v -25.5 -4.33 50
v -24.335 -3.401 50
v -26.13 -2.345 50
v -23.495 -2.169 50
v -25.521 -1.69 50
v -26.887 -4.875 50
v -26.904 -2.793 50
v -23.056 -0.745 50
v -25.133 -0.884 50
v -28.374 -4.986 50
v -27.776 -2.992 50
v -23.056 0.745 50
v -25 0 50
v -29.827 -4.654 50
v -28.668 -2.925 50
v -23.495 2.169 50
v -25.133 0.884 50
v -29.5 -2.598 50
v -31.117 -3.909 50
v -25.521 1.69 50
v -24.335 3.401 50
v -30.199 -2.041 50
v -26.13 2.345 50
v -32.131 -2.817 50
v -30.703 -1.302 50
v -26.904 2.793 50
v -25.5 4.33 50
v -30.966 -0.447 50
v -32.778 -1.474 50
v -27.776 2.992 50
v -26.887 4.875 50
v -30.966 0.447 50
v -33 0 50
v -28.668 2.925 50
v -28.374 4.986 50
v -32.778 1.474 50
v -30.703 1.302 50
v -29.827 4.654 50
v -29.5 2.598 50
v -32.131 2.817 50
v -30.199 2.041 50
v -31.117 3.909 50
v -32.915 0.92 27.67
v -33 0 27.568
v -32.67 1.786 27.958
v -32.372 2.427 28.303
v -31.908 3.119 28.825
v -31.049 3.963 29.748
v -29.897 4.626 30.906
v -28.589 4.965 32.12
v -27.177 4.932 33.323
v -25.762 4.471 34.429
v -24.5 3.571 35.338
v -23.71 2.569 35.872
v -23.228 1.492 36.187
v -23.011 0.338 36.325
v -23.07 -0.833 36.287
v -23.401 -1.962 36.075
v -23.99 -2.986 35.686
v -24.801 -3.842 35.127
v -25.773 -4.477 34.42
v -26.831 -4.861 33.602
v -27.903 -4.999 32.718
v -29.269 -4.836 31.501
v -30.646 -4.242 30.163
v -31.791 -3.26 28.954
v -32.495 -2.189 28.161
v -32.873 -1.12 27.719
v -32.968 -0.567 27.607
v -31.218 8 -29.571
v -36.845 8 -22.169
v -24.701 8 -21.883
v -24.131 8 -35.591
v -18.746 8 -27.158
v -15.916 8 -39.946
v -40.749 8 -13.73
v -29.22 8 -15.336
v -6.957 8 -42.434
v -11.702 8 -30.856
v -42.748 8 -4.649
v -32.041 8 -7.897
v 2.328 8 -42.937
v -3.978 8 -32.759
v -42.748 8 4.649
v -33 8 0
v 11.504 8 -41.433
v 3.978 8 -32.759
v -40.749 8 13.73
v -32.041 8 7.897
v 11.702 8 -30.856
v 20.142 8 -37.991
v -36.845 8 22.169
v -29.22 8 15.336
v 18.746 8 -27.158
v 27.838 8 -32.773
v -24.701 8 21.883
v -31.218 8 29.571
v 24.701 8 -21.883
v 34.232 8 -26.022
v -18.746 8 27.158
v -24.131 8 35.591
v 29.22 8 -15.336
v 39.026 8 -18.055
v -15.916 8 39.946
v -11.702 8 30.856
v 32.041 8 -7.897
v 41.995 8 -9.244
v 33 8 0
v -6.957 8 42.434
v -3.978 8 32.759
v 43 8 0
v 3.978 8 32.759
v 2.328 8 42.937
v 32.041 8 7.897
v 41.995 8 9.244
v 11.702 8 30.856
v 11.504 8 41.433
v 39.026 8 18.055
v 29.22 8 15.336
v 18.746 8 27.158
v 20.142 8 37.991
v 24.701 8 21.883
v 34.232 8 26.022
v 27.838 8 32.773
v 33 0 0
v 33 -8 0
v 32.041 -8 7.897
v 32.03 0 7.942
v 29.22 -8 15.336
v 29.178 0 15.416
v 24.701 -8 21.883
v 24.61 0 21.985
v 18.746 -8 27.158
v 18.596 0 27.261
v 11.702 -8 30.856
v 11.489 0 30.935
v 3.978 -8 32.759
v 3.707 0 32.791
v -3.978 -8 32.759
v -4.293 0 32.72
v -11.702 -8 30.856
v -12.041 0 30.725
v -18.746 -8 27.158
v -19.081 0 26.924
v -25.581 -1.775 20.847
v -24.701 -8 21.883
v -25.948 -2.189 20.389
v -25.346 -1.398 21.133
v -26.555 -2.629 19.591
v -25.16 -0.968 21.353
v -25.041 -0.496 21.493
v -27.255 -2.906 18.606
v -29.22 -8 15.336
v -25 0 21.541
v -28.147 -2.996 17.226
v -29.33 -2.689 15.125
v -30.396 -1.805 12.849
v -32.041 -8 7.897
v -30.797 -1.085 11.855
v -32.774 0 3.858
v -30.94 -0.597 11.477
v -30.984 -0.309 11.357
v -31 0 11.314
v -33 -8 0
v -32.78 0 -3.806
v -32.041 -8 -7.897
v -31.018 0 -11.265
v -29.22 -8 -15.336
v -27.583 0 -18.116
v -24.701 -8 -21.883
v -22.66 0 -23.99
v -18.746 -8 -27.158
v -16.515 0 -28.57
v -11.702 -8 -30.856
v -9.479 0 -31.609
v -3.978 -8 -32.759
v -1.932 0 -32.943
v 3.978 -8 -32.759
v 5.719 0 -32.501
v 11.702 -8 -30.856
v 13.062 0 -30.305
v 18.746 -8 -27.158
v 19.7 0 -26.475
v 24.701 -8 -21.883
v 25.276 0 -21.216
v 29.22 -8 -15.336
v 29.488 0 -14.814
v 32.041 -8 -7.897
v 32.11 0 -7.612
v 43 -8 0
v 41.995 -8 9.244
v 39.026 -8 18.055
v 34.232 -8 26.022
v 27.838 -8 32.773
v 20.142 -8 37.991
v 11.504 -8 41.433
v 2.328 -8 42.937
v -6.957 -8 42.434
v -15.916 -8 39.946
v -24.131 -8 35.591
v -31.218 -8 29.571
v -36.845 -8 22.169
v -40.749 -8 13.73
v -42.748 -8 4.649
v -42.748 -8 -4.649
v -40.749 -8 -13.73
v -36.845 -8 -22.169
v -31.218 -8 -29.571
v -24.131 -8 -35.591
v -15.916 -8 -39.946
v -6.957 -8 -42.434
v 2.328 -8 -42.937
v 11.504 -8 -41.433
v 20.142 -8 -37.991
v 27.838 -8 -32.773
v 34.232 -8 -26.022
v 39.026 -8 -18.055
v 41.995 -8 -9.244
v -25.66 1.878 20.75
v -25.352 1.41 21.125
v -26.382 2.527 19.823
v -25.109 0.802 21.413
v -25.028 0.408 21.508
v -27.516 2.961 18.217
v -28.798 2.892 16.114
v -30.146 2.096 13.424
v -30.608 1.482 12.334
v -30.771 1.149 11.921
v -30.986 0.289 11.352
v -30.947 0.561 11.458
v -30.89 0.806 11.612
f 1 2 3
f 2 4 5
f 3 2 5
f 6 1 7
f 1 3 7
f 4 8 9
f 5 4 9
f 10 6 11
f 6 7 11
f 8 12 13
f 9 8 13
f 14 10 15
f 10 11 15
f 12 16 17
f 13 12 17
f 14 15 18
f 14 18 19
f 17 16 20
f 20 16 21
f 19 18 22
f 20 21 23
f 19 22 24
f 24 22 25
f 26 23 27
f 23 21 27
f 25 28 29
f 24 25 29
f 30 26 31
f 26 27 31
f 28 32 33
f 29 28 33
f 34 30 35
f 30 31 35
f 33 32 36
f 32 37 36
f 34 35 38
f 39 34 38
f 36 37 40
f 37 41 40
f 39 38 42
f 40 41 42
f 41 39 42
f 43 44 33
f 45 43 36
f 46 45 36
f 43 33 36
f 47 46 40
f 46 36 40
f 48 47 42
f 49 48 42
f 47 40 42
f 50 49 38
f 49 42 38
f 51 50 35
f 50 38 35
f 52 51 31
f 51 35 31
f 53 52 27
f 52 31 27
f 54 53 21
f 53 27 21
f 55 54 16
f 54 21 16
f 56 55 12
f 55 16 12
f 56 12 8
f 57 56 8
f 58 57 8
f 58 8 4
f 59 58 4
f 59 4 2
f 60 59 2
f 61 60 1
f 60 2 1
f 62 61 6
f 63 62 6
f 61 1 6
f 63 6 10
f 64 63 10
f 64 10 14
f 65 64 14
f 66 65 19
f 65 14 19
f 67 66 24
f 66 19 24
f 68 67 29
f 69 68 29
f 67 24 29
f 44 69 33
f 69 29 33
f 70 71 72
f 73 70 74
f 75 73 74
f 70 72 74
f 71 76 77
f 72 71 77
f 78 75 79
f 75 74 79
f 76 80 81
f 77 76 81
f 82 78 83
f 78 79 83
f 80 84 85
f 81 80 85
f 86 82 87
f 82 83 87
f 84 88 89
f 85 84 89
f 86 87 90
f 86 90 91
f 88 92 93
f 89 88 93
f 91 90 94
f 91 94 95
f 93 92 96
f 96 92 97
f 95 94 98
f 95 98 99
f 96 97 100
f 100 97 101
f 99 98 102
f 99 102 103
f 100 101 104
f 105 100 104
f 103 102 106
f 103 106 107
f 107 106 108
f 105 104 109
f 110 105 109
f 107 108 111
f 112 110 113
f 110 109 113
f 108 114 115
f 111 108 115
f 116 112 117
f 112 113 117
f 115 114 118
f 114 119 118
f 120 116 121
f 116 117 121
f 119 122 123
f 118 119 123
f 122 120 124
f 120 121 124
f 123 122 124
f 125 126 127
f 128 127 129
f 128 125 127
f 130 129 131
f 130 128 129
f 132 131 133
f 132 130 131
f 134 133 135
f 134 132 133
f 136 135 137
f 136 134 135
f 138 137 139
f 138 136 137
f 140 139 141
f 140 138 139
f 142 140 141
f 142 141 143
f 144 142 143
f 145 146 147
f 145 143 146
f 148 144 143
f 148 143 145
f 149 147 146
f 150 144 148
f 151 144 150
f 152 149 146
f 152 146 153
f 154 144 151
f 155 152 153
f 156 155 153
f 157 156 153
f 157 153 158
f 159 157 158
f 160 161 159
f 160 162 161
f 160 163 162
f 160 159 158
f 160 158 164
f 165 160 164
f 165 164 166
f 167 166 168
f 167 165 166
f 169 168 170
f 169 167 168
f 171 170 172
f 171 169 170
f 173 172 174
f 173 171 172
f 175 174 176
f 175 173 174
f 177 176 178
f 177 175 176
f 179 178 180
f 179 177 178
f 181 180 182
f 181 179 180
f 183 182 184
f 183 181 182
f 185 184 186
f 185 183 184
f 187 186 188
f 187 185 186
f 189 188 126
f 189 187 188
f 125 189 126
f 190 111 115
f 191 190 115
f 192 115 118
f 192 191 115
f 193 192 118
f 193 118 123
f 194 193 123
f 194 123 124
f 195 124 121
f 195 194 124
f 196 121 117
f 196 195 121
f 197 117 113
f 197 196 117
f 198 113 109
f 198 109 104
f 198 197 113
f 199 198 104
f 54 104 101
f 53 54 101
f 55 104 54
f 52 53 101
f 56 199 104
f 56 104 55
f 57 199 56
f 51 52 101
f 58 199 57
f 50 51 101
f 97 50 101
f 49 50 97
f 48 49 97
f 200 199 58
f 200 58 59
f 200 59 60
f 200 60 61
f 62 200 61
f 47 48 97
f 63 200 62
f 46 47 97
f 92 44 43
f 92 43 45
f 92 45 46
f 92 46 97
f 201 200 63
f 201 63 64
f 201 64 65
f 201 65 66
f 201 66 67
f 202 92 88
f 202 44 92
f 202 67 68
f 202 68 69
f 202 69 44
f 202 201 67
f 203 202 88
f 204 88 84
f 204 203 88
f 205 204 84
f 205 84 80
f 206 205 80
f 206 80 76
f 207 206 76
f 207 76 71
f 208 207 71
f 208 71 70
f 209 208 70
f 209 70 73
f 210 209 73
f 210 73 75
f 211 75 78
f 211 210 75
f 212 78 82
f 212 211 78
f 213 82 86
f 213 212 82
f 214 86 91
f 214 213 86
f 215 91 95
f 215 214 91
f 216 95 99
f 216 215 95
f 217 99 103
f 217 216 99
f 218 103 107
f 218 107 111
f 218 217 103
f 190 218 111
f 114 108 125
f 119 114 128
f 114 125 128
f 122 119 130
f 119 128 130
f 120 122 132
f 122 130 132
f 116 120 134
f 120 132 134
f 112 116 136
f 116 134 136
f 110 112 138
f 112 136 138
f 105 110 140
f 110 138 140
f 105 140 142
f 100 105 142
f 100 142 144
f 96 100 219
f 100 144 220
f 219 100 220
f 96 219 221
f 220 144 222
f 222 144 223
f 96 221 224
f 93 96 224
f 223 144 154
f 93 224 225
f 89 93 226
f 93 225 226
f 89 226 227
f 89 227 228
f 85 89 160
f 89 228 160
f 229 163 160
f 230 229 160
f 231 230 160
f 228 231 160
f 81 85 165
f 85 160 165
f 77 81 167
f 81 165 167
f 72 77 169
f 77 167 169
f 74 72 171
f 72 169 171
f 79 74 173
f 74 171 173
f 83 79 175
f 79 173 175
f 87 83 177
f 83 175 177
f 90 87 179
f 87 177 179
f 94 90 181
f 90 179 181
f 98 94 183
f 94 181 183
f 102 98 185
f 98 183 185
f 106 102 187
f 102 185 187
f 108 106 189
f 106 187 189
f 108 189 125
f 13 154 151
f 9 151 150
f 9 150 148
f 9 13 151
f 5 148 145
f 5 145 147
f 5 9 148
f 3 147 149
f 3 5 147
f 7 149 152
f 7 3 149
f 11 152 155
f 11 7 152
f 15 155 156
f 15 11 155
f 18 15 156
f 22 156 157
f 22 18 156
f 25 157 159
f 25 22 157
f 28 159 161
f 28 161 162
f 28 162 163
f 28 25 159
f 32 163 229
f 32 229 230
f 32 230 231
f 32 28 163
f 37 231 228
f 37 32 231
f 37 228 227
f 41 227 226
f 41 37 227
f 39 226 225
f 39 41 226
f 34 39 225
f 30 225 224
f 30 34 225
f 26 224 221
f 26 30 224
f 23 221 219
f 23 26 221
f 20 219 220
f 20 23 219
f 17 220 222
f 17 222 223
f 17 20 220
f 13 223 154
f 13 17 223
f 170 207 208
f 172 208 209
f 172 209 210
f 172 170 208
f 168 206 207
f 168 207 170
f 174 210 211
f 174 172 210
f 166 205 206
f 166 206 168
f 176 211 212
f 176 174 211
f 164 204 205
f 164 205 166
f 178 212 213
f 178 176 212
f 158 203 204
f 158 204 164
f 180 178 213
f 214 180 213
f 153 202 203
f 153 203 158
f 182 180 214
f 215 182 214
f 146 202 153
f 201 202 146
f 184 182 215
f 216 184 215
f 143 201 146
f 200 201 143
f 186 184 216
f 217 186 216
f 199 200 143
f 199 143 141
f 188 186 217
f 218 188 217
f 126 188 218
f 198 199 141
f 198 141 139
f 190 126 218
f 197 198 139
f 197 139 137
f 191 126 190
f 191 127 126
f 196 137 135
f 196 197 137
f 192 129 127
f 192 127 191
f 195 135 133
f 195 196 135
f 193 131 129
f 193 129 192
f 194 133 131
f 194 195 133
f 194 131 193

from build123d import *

# Parameters (mm, degrees)
SKETCH001_R       = 43
PAD_DEPTH         = 8
SKETCH002_W       = 5
SKETCH002_H       = 50
SKETCH003_R       = 33
POCKET_DEPTH      = 8.001
POCKET_DEPTH_BACK = 8.001
SKETCH004_W       = 3
SKETCH004_H       = 50


with BuildPart() as part:
    # Sketch001 → Pad (new body, symmetric)
    with BuildSketch(Plane.XZ):
        Circle(SKETCH001_R)
    extrude(amount=PAD_DEPTH, both=True)

    # Sketch002 → Revolution (revolve)
    with BuildSketch(Plane.XZ):
        with Locations((-30.5, 25)):
            Rectangle(SKETCH002_W, SKETCH002_H)
    revolve(axis=Axis((-28, 0, 41.317169), (0, 0, -1)))

    # Sketch003 → Pocket (cut, two sides)
    with BuildSketch(Plane.XZ) as pocket_sk:
        Circle(SKETCH003_R)
    extrude(amount=-POCKET_DEPTH, mode=Mode.SUBTRACT)
    extrude(pocket_sk.sketch, amount=POCKET_DEPTH_BACK, mode=Mode.SUBTRACT)

    # Sketch004 → Groove (revolve, cut)
    with BuildSketch(Plane.XZ):
        with Locations((-26.5, 25)):
            Rectangle(SKETCH004_W, SKETCH004_H)
    revolve(axis=Axis((-28, 0, 41.317169), (0, 0, -1)), mode=Mode.SUBTRACT)


solid = part.part
